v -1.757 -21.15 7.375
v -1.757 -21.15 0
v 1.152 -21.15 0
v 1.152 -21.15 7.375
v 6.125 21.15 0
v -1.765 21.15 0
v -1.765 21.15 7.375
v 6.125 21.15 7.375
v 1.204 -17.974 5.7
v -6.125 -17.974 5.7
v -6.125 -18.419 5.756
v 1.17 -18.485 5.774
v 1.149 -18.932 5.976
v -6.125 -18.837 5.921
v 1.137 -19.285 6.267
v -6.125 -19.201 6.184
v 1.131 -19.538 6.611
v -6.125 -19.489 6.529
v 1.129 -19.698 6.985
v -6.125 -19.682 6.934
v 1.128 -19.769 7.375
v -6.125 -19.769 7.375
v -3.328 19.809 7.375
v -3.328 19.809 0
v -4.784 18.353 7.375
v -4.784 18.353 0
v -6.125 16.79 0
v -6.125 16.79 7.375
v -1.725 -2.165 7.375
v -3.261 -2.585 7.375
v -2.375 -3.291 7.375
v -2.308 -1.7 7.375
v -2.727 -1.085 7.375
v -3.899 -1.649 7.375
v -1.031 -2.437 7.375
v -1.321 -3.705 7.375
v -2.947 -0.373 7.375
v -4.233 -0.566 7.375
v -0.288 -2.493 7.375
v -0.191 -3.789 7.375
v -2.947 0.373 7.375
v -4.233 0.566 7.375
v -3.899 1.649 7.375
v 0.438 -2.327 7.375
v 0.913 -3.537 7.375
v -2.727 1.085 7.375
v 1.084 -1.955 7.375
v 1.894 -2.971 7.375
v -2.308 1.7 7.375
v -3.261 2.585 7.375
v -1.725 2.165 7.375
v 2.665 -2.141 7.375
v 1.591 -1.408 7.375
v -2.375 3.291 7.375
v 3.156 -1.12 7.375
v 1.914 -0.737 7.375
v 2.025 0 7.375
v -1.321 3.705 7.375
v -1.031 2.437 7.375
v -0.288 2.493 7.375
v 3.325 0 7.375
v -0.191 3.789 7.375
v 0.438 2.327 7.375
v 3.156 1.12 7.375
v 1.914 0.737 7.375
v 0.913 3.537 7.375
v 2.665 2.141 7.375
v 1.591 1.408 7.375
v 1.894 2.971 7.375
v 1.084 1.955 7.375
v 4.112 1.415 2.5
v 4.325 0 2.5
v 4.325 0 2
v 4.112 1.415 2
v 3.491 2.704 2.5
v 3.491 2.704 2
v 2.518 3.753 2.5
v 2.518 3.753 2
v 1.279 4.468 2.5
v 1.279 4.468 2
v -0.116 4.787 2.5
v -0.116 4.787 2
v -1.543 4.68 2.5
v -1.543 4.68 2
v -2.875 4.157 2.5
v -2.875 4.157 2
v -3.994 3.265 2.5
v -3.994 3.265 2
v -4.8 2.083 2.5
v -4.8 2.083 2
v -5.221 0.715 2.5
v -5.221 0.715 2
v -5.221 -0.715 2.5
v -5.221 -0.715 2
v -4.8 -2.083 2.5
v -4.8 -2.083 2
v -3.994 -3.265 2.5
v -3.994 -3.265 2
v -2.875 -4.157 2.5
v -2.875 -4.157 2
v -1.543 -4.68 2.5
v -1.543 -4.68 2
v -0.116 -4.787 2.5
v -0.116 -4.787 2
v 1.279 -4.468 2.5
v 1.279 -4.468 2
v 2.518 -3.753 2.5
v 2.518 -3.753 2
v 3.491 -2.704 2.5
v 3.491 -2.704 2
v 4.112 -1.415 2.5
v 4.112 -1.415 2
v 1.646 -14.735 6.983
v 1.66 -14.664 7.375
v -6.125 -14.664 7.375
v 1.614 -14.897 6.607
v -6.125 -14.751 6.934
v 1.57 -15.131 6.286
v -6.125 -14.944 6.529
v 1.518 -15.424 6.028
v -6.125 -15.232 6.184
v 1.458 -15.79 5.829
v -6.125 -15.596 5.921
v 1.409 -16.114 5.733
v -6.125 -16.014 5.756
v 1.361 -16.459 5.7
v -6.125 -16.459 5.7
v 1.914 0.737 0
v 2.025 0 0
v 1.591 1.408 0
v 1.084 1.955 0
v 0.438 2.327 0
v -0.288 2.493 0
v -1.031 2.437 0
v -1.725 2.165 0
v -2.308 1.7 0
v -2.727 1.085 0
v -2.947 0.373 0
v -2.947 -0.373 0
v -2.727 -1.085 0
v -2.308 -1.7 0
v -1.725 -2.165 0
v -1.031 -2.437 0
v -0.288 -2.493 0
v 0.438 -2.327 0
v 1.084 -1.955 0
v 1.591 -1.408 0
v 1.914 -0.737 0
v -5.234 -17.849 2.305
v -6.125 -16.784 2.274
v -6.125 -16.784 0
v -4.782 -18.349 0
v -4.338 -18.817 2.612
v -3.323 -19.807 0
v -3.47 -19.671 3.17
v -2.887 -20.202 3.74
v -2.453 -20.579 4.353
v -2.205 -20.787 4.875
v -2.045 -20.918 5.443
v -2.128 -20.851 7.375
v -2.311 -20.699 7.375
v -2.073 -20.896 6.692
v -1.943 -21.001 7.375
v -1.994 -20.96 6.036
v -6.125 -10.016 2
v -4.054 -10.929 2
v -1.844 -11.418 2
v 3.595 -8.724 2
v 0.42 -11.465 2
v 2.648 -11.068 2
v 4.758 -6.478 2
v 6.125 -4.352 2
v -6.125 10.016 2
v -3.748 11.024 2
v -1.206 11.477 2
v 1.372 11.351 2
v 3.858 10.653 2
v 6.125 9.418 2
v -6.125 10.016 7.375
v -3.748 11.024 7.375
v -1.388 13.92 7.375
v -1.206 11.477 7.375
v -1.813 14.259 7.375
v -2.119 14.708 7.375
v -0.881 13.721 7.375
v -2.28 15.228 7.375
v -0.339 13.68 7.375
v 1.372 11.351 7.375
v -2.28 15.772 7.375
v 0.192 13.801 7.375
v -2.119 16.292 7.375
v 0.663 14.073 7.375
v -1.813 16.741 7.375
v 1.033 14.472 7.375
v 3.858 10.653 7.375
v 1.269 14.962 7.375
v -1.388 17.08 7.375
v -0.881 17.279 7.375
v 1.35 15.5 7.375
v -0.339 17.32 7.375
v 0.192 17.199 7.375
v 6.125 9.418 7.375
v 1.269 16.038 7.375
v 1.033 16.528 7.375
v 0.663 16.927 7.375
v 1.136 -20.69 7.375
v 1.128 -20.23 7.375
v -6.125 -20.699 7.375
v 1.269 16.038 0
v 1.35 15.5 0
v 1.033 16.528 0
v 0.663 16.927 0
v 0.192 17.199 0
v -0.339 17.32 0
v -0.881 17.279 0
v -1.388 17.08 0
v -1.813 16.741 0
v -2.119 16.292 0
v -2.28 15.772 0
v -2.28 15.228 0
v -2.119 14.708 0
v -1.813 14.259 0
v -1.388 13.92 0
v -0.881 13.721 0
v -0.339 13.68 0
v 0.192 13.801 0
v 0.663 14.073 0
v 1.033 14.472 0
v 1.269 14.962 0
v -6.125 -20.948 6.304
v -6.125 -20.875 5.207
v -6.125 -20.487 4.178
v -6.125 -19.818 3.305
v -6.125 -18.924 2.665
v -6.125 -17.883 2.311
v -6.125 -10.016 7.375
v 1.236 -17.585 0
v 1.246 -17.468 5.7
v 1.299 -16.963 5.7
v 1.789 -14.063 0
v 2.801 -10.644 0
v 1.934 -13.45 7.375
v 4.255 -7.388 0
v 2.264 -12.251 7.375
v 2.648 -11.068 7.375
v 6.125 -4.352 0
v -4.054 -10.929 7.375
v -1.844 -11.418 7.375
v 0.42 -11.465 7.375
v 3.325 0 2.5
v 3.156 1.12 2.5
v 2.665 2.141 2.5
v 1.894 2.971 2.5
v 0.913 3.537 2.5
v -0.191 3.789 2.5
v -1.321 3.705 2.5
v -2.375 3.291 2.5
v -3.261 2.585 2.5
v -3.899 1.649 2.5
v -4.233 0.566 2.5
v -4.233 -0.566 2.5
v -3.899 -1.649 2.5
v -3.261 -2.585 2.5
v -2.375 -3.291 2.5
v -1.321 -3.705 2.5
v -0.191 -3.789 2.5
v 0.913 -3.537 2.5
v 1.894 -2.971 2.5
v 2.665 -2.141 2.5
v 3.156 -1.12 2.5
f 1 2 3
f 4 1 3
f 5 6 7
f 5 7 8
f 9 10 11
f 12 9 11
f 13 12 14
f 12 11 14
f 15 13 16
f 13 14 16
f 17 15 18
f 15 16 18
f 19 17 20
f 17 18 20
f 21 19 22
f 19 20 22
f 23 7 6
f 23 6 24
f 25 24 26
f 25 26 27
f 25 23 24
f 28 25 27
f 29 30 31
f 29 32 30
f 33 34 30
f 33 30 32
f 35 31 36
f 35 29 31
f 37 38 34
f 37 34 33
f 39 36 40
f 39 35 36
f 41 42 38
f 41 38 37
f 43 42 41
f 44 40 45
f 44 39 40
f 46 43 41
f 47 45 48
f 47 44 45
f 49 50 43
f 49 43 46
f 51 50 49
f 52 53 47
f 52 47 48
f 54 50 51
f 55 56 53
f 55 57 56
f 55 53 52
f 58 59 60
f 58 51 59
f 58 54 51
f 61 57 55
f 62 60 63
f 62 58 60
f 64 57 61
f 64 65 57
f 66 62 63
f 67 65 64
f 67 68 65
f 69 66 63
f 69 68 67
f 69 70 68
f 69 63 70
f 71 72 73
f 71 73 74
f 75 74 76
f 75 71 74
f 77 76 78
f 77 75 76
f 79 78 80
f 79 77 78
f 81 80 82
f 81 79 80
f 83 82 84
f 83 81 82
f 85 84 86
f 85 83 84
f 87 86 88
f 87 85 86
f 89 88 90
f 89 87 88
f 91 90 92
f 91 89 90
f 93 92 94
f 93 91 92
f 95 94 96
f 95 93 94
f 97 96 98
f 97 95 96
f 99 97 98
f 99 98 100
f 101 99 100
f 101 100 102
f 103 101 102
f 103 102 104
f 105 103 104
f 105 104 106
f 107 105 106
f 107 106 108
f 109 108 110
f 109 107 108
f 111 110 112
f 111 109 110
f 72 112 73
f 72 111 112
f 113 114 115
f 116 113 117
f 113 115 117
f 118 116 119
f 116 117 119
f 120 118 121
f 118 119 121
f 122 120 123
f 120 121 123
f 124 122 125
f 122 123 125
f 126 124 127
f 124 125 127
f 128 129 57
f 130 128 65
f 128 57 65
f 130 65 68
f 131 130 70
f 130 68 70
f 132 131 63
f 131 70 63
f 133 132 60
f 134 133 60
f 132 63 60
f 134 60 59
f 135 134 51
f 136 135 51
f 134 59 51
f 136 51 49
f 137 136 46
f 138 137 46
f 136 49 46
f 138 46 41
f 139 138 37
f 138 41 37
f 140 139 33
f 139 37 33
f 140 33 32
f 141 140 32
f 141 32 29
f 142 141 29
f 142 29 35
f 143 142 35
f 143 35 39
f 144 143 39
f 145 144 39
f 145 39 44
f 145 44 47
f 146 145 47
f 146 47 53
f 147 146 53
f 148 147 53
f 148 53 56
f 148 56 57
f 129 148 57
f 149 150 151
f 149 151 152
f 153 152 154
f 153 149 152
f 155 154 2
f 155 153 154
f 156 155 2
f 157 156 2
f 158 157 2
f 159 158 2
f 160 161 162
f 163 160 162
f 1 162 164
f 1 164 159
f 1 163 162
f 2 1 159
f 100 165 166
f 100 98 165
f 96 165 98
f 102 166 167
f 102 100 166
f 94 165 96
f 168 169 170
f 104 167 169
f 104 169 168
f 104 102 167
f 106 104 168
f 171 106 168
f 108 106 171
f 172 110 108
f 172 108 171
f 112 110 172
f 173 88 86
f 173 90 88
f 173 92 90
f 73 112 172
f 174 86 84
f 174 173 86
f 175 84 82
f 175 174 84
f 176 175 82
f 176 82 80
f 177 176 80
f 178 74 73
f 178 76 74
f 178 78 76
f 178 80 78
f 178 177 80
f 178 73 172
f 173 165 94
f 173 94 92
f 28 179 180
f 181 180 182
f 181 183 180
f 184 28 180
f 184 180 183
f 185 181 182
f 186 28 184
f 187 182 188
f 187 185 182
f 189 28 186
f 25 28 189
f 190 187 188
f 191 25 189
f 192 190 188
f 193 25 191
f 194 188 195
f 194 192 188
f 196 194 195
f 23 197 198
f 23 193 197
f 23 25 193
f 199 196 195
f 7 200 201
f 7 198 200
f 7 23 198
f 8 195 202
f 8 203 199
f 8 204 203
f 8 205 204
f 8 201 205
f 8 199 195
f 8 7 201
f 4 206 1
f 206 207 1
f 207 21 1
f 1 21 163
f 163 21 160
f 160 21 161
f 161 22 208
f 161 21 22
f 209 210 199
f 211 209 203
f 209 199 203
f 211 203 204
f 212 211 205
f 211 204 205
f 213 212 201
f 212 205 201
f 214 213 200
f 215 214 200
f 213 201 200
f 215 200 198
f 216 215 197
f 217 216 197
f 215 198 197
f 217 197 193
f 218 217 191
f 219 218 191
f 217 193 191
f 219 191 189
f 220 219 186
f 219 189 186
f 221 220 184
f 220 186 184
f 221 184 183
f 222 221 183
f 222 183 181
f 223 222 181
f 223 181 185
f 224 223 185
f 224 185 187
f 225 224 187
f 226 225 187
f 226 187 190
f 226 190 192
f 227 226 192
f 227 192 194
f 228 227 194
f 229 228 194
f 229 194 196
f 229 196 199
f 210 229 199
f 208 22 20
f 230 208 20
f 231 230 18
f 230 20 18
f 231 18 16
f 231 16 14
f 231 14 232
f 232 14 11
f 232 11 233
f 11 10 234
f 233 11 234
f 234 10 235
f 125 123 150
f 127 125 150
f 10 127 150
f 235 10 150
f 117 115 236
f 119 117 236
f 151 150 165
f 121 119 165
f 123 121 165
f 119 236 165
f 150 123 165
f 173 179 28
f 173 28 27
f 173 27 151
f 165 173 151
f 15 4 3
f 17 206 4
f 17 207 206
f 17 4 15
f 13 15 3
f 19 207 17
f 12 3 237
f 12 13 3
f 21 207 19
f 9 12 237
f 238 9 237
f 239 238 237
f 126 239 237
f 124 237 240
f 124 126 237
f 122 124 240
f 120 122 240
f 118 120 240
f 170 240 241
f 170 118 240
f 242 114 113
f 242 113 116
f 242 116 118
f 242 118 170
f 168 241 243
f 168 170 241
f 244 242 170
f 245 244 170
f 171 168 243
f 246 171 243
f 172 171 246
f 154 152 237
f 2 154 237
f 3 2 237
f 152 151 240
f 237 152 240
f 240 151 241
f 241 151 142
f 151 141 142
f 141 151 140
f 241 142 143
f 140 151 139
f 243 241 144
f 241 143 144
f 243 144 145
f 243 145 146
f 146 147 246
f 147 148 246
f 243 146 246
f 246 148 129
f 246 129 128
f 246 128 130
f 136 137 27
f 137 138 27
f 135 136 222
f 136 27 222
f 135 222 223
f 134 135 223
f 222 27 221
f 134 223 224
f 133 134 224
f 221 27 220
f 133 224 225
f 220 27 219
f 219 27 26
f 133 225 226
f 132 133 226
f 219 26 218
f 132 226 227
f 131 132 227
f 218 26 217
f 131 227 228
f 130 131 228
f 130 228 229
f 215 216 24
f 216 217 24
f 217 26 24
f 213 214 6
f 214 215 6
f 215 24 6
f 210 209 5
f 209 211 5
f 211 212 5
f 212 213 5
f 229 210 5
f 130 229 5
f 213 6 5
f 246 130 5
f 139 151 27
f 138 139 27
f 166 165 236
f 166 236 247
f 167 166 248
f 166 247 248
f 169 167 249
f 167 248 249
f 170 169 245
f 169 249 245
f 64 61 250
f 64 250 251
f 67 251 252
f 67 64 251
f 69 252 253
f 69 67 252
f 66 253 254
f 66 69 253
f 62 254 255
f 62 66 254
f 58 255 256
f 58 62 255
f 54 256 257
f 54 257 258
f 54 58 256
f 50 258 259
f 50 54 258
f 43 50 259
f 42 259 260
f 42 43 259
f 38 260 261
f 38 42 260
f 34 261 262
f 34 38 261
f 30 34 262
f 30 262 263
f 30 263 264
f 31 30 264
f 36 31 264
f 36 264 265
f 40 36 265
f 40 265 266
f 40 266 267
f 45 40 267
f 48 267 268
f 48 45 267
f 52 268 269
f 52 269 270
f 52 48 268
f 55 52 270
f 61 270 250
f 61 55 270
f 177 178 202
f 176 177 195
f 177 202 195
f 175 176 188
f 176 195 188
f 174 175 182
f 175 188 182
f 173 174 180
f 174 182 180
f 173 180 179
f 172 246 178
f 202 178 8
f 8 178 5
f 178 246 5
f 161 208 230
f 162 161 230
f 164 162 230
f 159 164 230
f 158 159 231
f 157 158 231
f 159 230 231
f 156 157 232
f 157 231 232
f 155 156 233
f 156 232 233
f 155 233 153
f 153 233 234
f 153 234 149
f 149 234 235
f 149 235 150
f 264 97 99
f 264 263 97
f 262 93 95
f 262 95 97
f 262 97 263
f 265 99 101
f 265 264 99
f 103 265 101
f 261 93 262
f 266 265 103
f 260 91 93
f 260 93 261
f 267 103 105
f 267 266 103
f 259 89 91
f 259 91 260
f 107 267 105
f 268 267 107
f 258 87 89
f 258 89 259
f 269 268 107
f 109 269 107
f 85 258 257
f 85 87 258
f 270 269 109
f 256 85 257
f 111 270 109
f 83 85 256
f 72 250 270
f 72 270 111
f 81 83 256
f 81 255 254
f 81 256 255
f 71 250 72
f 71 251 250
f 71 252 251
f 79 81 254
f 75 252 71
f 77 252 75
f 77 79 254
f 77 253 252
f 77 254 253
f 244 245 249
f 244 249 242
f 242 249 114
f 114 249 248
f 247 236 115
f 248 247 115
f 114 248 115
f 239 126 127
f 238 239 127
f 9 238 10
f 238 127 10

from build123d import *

# Parameters (mm, degrees)
SKETCH1_W           = 12.25
SKETCH1_H           = 42.3
BOSS_EXTRUDE1_DEPTH = 7.375
SKETCH2_R           = 1.825
SKETCH2_R_2         = 2.5
CUT_EXTRUDE1_DEPTH  = 24.22129949
CUT_EXTRUDE2_DEPTH  = 24.22129949
SKETCH4_R           = 11.5
CUT_EXTRUDE3_DEPTH  = 5.375
BOSS_EXTRUDE2_START = 0.5
SKETCH5_R           = 4.8
SKETCH5_R_2         = 2.5
BOSS_EXTRUDE2_DEPTH = 0.5
BOSS_EXTRUDE3_START = 4.875
SKETCH6_R           = 3.8
SKETCH6_R_2         = 2.5
BOSS_EXTRUDE3_DEPTH = 4.875
BOSS_EXTRUDE4_REACH = 27.53
CUT_EXTRUDE4_DEPTH  = 26.529896802


with BuildPart() as part:
    # Sketch1 → Boss-Extrude1 (new body)
    with BuildSketch(Plane.XY):
        Rectangle(SKETCH1_W, SKETCH1_H)
    extrude(amount=BOSS_EXTRUDE1_DEPTH)

    # Sketch2 → Cut-Extrude1 (cut, through all)
    with BuildSketch(Plane.XY.offset(7.375)):
        with Locations((-0.475, 15.5)):
            Circle(SKETCH2_R)
        with Locations((-0.475, 0)):
            Circle(SKETCH2_R_2)
    extrude(amount=-CUT_EXTRUDE1_DEPTH, mode=Mode.SUBTRACT)

    # Sketch3 → Cut-Extrude2 (cut, through all)
    with BuildSketch(Plane.XY.offset(7.375)):
        with BuildLine():
            Line((-6.125, -21.15), (-6.125, -16.783974467))
            ThreePointArc((-6.125, -16.783974467), (-4.066466825, -19.092268783), (-1.757457575, -21.15))
            Line((-1.757457575, -21.15), (-6.125, -21.15))
        make_face()
        with BuildLine():
            Line((-6.125, 16.789834467), (-6.125, 21.15))
            Line((-6.125, 21.15), (-1.764842259, 21.15))
            ThreePointArc((-1.764842259, 21.15), (-4.069800152, 19.094796032), (-6.125, 16.789834467))
        make_face()
        with BuildLine():
            Line((6.125, -4.351807973), (6.125, -21.15))
            Line((6.125, -21.15), (1.151863079, -21.15))
            ThreePointArc((1.151863079, -21.15), (2.238128282, -12.336341525), (6.125, -4.351807973))
        make_face()
    extrude(amount=-CUT_EXTRUDE2_DEPTH, mode=Mode.SUBTRACT)

    # Sketch4 → Cut-Extrude3 (cut)
    with BuildSketch(Plane.XY.offset(7.375)):
        with Locations((-0.475, 0)):
            Circle(SKETCH4_R)
    extrude(amount=-CUT_EXTRUDE3_DEPTH, mode=Mode.SUBTRACT)

    # Sketch5 → Boss-Extrude2 (add)
    with BuildSketch(Plane.XY.offset(2).offset(BOSS_EXTRUDE2_START)):
        with Locations((-0.475, 0)):
            Circle(SKETCH5_R)
        with Locations((-0.475, 0)):
            Circle(SKETCH5_R_2, mode=Mode.SUBTRACT)
    extrude(amount=-BOSS_EXTRUDE2_DEPTH)

    # Sketch6 → Boss-Extrude3 (add)
    with BuildSketch(Plane.XY.offset(2.5).offset(BOSS_EXTRUDE3_START)):
        with Locations((-0.475, 0)):
            Circle(SKETCH6_R)
        with Locations((-0.475, 0)):
            Circle(SKETCH6_R_2, mode=Mode.SUBTRACT)
    extrude(amount=-BOSS_EXTRUDE3_DEPTH)

    # Sketch7 → Boss-Extrude4 (add, up to next)
    with BuildSketch(Plane(origin=(-6.125, 0, 0), x_dir=(0, 0, -1), z_dir=(1, 0, 0)), mode=Mode.PRIVATE) as boss_extrude4_sk1:
        with BuildLine():
            Line((-7.375, -13.721160181), (-7.375, -20.698803049))
            ThreePointArc((-7.375, -20.698803049), (-2.25, -17.209981615), (-7.375, -13.721160181))
        make_face()
    boss_extrude4_tool1 = extrude(boss_extrude4_sk1.sketch, amount=BOSS_EXTRUDE4_REACH, mode=Mode.PRIVATE) - part.part
    add(boss_extrude4_tool1.solids().sort_by_distance((-6.125, -17.209982, 5.119864))[0])

    # Sketch8 → Cut-Extrude4 (cut, through all)
    with BuildSketch(Plane(origin=(-6.125, 0, 0), x_dir=(0, 0, -1), z_dir=(1, 0, 0))):
        with BuildLine():
            Line((-9.3, -17.973571615), (-9.3, -16.459481615))
            ThreePointArc((-9.3, -16.459481615), (-7.5, -14.659481615), (-5.7, -16.459481615))
            Line((-5.7, -16.459481615), (-5.7, -17.973571615))
            ThreePointArc((-5.7, -17.973571615), (-7.5, -19.773571615), (-9.3, -17.973571615))
        make_face()
    extrude(amount=CUT_EXTRUDE4_DEPTH, mode=Mode.SUBTRACT)


solid = part.part
